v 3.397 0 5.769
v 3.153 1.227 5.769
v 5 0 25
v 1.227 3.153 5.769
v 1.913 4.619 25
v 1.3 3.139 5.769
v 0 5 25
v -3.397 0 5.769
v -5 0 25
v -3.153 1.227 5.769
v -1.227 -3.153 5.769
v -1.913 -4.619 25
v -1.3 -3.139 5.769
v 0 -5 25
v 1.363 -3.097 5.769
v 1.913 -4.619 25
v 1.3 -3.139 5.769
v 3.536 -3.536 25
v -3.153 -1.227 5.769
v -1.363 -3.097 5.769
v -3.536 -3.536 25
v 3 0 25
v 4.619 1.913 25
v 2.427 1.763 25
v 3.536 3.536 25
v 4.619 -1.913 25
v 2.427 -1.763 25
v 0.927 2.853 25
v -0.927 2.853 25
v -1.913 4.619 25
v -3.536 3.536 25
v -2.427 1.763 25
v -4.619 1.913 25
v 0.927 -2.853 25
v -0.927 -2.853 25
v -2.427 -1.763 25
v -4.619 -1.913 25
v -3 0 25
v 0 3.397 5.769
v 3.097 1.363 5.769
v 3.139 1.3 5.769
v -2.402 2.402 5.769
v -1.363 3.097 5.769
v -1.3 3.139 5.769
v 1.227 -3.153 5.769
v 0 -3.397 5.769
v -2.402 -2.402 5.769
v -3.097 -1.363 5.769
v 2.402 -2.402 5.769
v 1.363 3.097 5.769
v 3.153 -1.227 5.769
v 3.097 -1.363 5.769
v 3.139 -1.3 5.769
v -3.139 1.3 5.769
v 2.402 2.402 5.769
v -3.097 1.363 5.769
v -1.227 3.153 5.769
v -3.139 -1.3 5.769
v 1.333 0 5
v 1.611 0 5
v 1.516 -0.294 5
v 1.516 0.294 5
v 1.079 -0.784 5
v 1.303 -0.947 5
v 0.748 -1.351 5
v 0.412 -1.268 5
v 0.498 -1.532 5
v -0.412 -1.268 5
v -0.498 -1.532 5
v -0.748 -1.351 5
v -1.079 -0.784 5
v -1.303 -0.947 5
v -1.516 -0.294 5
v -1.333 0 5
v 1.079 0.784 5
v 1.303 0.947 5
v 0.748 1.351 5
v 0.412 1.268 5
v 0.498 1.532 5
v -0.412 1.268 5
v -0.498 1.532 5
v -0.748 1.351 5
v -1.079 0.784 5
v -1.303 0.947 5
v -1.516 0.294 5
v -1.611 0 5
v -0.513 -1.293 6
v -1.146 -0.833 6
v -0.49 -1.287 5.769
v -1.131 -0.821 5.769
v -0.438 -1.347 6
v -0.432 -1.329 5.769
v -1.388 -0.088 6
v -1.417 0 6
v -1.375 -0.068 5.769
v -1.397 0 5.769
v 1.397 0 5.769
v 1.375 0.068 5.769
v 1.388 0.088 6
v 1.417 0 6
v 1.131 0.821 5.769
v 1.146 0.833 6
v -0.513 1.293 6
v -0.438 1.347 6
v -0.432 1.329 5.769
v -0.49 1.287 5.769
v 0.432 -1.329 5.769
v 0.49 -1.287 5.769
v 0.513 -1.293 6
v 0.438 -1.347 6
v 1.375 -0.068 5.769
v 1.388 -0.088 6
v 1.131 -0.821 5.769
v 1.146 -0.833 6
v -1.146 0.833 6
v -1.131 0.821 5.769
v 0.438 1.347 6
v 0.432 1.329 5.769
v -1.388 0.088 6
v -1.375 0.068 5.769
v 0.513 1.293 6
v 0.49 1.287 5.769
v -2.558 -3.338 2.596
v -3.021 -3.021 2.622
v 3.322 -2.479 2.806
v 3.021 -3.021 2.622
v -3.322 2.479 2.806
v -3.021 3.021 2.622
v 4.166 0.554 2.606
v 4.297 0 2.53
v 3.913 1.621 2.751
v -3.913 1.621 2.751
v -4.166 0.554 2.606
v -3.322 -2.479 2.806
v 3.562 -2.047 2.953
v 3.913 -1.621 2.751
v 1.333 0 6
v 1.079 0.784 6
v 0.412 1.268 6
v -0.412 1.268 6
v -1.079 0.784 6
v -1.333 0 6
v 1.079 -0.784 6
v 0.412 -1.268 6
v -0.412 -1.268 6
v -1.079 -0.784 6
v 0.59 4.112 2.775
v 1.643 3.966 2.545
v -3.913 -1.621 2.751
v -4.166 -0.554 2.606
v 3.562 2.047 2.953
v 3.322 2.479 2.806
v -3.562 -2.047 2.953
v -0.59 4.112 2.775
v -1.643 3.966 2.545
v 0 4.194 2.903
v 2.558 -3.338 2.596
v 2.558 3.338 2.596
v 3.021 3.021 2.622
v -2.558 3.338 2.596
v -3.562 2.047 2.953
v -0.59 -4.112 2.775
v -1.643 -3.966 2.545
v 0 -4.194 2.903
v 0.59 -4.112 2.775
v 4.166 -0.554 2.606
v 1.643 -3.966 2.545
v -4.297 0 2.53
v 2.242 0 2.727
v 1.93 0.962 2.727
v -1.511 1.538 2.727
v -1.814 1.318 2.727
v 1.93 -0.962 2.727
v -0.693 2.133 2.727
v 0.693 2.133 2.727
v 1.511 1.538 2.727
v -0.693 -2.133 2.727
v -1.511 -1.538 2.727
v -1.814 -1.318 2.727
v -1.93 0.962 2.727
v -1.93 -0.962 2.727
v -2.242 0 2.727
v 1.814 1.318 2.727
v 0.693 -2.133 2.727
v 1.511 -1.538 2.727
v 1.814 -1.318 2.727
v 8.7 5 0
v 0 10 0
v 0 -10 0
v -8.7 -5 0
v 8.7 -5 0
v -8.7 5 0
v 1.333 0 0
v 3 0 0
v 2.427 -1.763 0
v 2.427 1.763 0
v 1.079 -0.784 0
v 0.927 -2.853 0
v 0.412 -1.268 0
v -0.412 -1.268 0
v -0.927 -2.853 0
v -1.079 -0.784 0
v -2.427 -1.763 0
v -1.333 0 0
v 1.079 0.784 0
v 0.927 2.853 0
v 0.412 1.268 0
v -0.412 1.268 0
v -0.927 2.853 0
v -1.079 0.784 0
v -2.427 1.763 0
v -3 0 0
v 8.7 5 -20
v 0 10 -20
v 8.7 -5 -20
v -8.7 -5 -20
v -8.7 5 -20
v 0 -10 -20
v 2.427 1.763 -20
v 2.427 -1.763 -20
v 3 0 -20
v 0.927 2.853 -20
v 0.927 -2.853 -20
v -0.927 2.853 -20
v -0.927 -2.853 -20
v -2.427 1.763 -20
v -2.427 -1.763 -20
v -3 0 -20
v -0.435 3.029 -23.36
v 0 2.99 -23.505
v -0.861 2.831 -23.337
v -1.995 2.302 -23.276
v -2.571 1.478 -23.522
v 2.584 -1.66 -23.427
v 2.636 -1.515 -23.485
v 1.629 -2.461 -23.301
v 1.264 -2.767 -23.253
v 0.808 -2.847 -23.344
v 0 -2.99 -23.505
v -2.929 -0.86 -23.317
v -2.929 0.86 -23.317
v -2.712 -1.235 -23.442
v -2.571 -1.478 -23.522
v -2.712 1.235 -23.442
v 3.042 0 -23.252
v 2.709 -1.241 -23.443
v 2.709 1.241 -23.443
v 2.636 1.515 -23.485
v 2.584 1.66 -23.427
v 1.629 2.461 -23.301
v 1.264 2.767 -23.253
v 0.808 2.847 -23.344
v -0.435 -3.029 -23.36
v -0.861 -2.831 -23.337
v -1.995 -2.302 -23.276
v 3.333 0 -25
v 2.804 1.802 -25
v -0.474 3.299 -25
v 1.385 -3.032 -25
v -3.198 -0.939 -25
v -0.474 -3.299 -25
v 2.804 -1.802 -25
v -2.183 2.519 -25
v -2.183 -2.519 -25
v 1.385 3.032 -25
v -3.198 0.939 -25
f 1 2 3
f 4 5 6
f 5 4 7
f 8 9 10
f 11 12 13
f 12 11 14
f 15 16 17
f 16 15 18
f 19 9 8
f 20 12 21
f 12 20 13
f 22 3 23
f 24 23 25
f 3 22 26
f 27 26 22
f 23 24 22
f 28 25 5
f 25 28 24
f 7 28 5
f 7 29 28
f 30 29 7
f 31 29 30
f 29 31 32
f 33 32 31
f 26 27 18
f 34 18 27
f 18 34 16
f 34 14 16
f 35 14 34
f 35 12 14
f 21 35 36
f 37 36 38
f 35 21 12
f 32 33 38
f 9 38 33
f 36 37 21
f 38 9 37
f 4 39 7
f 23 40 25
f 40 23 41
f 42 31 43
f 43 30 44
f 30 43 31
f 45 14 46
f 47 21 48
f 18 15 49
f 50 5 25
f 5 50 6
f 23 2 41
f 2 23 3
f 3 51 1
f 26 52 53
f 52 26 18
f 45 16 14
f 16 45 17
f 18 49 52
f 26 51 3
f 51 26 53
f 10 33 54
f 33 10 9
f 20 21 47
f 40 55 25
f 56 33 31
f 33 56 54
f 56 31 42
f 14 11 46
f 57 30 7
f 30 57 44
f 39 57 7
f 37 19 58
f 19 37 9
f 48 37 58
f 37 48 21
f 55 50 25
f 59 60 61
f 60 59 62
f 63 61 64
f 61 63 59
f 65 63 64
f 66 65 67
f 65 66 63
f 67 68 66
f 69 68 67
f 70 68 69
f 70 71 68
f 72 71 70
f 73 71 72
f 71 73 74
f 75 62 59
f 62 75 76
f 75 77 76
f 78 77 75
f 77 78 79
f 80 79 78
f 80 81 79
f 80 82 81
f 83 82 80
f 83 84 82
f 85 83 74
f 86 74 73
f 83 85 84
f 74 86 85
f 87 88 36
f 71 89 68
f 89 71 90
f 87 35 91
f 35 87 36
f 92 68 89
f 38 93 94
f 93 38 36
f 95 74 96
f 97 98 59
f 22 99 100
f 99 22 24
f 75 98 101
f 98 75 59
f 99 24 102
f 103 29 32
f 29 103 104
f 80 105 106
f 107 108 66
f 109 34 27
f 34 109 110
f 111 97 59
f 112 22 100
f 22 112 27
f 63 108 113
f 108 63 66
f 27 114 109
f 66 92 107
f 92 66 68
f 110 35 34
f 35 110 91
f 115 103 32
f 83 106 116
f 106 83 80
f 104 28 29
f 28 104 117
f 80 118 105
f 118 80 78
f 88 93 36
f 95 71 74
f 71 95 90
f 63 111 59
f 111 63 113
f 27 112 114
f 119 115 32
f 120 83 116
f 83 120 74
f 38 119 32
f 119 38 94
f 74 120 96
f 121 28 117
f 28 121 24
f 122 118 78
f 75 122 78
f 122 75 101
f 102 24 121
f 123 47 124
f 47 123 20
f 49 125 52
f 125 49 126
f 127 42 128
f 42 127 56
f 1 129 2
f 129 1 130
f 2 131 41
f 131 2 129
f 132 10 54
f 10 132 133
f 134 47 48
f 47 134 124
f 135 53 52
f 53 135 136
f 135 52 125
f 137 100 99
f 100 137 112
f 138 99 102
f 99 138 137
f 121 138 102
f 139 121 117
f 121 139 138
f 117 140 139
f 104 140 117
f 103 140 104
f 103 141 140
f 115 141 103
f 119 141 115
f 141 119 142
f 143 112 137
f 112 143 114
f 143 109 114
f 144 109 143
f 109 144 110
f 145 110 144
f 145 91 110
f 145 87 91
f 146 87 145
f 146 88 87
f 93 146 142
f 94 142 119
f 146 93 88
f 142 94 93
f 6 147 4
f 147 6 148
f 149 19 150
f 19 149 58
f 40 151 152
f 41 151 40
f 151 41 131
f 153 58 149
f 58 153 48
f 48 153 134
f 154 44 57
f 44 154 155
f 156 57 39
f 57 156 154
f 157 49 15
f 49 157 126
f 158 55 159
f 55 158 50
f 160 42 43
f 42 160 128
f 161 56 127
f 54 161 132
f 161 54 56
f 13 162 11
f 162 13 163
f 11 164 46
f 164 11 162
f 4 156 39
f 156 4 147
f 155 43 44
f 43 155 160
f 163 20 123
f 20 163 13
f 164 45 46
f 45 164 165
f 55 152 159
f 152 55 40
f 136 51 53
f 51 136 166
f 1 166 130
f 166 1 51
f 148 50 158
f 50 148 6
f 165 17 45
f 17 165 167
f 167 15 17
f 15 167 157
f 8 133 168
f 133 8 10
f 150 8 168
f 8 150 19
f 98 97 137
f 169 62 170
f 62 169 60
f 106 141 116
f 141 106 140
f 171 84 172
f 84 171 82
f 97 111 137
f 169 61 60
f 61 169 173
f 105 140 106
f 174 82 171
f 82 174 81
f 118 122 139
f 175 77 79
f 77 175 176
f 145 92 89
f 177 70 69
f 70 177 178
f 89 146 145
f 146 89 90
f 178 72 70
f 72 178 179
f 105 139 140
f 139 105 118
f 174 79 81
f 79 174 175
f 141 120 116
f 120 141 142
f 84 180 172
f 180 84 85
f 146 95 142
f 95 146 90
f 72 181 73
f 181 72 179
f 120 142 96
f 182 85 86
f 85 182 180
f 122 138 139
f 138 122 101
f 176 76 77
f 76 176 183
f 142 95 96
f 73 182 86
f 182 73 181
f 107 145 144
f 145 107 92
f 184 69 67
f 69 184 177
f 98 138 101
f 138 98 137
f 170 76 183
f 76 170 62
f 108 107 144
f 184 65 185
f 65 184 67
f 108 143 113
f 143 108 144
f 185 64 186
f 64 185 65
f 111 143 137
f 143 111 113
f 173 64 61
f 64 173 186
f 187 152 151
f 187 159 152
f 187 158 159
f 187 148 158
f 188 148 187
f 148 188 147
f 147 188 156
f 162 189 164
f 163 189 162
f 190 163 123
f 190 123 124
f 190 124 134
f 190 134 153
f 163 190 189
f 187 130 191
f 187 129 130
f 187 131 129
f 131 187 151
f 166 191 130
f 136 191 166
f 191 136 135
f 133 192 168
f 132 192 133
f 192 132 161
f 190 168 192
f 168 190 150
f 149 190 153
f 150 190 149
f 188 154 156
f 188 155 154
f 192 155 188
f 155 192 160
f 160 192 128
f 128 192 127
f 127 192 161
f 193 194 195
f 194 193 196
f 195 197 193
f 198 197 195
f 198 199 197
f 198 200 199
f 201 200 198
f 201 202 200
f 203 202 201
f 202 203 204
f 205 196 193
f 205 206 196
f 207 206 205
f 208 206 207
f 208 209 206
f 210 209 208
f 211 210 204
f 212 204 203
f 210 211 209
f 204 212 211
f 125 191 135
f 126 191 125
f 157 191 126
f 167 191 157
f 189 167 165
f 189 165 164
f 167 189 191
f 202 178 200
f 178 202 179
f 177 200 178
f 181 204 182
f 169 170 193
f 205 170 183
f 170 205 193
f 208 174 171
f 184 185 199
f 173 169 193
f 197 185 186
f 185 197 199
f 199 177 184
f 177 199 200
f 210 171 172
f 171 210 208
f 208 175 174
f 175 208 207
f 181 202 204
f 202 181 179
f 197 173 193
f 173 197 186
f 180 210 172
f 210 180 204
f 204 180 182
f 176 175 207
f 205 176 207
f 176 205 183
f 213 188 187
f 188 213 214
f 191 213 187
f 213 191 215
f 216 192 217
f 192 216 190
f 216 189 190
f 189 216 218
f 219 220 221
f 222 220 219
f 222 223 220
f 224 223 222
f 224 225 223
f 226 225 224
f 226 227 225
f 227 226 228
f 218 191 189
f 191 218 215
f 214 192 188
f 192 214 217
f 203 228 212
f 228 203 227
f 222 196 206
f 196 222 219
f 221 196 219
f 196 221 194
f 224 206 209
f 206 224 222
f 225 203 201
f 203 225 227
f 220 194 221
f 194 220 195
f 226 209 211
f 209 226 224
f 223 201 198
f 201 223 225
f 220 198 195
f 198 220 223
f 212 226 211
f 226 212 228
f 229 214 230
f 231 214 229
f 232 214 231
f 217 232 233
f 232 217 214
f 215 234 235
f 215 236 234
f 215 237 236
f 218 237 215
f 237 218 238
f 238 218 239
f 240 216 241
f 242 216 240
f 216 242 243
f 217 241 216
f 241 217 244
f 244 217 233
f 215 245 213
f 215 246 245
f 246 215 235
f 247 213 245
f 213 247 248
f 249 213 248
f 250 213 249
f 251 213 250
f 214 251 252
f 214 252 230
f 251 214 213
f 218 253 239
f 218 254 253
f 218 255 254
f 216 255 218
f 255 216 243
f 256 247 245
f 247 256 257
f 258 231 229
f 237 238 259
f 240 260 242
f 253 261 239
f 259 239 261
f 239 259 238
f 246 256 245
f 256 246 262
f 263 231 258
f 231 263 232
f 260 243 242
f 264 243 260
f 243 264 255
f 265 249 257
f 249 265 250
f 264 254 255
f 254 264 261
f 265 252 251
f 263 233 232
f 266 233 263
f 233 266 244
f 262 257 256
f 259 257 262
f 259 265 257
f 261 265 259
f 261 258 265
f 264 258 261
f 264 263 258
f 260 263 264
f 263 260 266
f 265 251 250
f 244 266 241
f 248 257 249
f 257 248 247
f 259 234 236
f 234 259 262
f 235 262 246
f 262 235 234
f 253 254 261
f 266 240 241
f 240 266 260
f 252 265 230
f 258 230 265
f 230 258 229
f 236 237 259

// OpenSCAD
// manipulable parameters!
radius = 10; // default: 10
stemHeight = 20; // default: 20
stemBracketHeight = 1; // default: 1
bodyHeight = 20; // default: 20
elongation = 5; // default: 8

// parameters i ask you not to touch
hollowThickness = 2;
opening = 4;
stemTopBase = radius / 2;
stemBottomBase = radius / 3;

// stem
translate([0, 0, elongation]){
	difference() {
		cylinder(h = stemHeight, r1 = stemBottomBase, r2 = stemTopBase, center = false);
		cylinder(h = stemHeight, r1 = stemBottomBase - hollowThickness, r2 = stemTopBase - hollowThickness, center = false);
	}
}

// stem bracket
translate([0, 0, 0]) {
	difference() {
		cylinder(h = elongation + stemBracketHeight, r1 = stemTopBase, r2 = stemBottomBase, center = false);
		cylinder(h = elongation + stemBracketHeight, r1 = stemTopBase - hollowThickness, r2 = stemBottomBase - hollowThickness, center = false);
	}
}

// top
translate([0, 0, 0]) {
difference() {
	polyhedron(
	  points = [[radius * 0.87, radius * 0.5, 0], // 0
	            [radius * 0, radius * 1, 0], // 1
	            [radius * -0.87, radius * 0.5, 0], // 2
	            [radius * -0.87, radius * -0.5, 0], // 3
	            [radius * 0, radius * -1, 0], // 4
	            [radius * 0.87, radius * -0.5, 0], // 5
	            [0, 0, elongation]], // the apex point, 6
	  triangles = [[0, 6, 1], [1, 6, 2], [2, 6, 3], [3, 6, 4], [4, 6, 5], [5, 6, 0], // sides
	               [0, 1, 3], [1, 2, 3], [0, 3, 4], [0, 4, 5]] // base
	 );
	cylinder(h = elongation, r1 = stemBottomBase - hollowThickness, r2 = stemTopBase - hollowThickness, center = false);
}
}

// body
translate([0, 0, -bodyHeight]) {
	difference() {
		linear_extrude(height = bodyHeight, center = false, convexity = 10) {
		  polygon(
	      points = [[radius * 0.87, radius * 0.5], // 0
	                [radius * 0, radius * 1], // 1
	                [radius * -0.87, radius * 0.5], // 2
	                [radius * -0.87, radius * -0.5], // 3
	                [radius * 0, radius * -1], // 4
	                [radius * 0.87, radius * -0.5]]
	    );
		}
		cylinder(h = bodyHeight, r1 = stemTopBase - hollowThickness, r2 = stemTopBase - hollowThickness, center = false);
	}
}

// bottom
translate([0, 0,  -bodyHeight]) {
	rotate(a = [0, 180, 0]) {
		polyhedron(
		  points = [[radius * 0.87, radius * 0.5, 0], // 0
		            [radius * 0, radius * 1, 0], // 1
		            [radius * -0.87, radius * 0.5, 0], // 2
		            [radius * -0.87, radius * -0.5, 0], // 3
		            [radius * 0, radius * -1, 0], // 4
		            [radius * 0.87, radius * -0.5, 0], // 5
		            [0, 0, elongation]], // the apex point, 6
		  triangles = [[0, 6, 1], [1, 6, 2], [2, 6, 3], [3, 6, 4], [4, 6, 5], [5, 6, 0], // sides
		               [0, 1, 3], [1, 2, 3], [0, 3, 4], [0, 4, 5]] // base
		 );
	}
}

// base
translate([0, 0,  -bodyHeight - elongation]){
	cylinder(h = 5, r1 = radius / 3, r2 = radius / 4, center = false);
}
